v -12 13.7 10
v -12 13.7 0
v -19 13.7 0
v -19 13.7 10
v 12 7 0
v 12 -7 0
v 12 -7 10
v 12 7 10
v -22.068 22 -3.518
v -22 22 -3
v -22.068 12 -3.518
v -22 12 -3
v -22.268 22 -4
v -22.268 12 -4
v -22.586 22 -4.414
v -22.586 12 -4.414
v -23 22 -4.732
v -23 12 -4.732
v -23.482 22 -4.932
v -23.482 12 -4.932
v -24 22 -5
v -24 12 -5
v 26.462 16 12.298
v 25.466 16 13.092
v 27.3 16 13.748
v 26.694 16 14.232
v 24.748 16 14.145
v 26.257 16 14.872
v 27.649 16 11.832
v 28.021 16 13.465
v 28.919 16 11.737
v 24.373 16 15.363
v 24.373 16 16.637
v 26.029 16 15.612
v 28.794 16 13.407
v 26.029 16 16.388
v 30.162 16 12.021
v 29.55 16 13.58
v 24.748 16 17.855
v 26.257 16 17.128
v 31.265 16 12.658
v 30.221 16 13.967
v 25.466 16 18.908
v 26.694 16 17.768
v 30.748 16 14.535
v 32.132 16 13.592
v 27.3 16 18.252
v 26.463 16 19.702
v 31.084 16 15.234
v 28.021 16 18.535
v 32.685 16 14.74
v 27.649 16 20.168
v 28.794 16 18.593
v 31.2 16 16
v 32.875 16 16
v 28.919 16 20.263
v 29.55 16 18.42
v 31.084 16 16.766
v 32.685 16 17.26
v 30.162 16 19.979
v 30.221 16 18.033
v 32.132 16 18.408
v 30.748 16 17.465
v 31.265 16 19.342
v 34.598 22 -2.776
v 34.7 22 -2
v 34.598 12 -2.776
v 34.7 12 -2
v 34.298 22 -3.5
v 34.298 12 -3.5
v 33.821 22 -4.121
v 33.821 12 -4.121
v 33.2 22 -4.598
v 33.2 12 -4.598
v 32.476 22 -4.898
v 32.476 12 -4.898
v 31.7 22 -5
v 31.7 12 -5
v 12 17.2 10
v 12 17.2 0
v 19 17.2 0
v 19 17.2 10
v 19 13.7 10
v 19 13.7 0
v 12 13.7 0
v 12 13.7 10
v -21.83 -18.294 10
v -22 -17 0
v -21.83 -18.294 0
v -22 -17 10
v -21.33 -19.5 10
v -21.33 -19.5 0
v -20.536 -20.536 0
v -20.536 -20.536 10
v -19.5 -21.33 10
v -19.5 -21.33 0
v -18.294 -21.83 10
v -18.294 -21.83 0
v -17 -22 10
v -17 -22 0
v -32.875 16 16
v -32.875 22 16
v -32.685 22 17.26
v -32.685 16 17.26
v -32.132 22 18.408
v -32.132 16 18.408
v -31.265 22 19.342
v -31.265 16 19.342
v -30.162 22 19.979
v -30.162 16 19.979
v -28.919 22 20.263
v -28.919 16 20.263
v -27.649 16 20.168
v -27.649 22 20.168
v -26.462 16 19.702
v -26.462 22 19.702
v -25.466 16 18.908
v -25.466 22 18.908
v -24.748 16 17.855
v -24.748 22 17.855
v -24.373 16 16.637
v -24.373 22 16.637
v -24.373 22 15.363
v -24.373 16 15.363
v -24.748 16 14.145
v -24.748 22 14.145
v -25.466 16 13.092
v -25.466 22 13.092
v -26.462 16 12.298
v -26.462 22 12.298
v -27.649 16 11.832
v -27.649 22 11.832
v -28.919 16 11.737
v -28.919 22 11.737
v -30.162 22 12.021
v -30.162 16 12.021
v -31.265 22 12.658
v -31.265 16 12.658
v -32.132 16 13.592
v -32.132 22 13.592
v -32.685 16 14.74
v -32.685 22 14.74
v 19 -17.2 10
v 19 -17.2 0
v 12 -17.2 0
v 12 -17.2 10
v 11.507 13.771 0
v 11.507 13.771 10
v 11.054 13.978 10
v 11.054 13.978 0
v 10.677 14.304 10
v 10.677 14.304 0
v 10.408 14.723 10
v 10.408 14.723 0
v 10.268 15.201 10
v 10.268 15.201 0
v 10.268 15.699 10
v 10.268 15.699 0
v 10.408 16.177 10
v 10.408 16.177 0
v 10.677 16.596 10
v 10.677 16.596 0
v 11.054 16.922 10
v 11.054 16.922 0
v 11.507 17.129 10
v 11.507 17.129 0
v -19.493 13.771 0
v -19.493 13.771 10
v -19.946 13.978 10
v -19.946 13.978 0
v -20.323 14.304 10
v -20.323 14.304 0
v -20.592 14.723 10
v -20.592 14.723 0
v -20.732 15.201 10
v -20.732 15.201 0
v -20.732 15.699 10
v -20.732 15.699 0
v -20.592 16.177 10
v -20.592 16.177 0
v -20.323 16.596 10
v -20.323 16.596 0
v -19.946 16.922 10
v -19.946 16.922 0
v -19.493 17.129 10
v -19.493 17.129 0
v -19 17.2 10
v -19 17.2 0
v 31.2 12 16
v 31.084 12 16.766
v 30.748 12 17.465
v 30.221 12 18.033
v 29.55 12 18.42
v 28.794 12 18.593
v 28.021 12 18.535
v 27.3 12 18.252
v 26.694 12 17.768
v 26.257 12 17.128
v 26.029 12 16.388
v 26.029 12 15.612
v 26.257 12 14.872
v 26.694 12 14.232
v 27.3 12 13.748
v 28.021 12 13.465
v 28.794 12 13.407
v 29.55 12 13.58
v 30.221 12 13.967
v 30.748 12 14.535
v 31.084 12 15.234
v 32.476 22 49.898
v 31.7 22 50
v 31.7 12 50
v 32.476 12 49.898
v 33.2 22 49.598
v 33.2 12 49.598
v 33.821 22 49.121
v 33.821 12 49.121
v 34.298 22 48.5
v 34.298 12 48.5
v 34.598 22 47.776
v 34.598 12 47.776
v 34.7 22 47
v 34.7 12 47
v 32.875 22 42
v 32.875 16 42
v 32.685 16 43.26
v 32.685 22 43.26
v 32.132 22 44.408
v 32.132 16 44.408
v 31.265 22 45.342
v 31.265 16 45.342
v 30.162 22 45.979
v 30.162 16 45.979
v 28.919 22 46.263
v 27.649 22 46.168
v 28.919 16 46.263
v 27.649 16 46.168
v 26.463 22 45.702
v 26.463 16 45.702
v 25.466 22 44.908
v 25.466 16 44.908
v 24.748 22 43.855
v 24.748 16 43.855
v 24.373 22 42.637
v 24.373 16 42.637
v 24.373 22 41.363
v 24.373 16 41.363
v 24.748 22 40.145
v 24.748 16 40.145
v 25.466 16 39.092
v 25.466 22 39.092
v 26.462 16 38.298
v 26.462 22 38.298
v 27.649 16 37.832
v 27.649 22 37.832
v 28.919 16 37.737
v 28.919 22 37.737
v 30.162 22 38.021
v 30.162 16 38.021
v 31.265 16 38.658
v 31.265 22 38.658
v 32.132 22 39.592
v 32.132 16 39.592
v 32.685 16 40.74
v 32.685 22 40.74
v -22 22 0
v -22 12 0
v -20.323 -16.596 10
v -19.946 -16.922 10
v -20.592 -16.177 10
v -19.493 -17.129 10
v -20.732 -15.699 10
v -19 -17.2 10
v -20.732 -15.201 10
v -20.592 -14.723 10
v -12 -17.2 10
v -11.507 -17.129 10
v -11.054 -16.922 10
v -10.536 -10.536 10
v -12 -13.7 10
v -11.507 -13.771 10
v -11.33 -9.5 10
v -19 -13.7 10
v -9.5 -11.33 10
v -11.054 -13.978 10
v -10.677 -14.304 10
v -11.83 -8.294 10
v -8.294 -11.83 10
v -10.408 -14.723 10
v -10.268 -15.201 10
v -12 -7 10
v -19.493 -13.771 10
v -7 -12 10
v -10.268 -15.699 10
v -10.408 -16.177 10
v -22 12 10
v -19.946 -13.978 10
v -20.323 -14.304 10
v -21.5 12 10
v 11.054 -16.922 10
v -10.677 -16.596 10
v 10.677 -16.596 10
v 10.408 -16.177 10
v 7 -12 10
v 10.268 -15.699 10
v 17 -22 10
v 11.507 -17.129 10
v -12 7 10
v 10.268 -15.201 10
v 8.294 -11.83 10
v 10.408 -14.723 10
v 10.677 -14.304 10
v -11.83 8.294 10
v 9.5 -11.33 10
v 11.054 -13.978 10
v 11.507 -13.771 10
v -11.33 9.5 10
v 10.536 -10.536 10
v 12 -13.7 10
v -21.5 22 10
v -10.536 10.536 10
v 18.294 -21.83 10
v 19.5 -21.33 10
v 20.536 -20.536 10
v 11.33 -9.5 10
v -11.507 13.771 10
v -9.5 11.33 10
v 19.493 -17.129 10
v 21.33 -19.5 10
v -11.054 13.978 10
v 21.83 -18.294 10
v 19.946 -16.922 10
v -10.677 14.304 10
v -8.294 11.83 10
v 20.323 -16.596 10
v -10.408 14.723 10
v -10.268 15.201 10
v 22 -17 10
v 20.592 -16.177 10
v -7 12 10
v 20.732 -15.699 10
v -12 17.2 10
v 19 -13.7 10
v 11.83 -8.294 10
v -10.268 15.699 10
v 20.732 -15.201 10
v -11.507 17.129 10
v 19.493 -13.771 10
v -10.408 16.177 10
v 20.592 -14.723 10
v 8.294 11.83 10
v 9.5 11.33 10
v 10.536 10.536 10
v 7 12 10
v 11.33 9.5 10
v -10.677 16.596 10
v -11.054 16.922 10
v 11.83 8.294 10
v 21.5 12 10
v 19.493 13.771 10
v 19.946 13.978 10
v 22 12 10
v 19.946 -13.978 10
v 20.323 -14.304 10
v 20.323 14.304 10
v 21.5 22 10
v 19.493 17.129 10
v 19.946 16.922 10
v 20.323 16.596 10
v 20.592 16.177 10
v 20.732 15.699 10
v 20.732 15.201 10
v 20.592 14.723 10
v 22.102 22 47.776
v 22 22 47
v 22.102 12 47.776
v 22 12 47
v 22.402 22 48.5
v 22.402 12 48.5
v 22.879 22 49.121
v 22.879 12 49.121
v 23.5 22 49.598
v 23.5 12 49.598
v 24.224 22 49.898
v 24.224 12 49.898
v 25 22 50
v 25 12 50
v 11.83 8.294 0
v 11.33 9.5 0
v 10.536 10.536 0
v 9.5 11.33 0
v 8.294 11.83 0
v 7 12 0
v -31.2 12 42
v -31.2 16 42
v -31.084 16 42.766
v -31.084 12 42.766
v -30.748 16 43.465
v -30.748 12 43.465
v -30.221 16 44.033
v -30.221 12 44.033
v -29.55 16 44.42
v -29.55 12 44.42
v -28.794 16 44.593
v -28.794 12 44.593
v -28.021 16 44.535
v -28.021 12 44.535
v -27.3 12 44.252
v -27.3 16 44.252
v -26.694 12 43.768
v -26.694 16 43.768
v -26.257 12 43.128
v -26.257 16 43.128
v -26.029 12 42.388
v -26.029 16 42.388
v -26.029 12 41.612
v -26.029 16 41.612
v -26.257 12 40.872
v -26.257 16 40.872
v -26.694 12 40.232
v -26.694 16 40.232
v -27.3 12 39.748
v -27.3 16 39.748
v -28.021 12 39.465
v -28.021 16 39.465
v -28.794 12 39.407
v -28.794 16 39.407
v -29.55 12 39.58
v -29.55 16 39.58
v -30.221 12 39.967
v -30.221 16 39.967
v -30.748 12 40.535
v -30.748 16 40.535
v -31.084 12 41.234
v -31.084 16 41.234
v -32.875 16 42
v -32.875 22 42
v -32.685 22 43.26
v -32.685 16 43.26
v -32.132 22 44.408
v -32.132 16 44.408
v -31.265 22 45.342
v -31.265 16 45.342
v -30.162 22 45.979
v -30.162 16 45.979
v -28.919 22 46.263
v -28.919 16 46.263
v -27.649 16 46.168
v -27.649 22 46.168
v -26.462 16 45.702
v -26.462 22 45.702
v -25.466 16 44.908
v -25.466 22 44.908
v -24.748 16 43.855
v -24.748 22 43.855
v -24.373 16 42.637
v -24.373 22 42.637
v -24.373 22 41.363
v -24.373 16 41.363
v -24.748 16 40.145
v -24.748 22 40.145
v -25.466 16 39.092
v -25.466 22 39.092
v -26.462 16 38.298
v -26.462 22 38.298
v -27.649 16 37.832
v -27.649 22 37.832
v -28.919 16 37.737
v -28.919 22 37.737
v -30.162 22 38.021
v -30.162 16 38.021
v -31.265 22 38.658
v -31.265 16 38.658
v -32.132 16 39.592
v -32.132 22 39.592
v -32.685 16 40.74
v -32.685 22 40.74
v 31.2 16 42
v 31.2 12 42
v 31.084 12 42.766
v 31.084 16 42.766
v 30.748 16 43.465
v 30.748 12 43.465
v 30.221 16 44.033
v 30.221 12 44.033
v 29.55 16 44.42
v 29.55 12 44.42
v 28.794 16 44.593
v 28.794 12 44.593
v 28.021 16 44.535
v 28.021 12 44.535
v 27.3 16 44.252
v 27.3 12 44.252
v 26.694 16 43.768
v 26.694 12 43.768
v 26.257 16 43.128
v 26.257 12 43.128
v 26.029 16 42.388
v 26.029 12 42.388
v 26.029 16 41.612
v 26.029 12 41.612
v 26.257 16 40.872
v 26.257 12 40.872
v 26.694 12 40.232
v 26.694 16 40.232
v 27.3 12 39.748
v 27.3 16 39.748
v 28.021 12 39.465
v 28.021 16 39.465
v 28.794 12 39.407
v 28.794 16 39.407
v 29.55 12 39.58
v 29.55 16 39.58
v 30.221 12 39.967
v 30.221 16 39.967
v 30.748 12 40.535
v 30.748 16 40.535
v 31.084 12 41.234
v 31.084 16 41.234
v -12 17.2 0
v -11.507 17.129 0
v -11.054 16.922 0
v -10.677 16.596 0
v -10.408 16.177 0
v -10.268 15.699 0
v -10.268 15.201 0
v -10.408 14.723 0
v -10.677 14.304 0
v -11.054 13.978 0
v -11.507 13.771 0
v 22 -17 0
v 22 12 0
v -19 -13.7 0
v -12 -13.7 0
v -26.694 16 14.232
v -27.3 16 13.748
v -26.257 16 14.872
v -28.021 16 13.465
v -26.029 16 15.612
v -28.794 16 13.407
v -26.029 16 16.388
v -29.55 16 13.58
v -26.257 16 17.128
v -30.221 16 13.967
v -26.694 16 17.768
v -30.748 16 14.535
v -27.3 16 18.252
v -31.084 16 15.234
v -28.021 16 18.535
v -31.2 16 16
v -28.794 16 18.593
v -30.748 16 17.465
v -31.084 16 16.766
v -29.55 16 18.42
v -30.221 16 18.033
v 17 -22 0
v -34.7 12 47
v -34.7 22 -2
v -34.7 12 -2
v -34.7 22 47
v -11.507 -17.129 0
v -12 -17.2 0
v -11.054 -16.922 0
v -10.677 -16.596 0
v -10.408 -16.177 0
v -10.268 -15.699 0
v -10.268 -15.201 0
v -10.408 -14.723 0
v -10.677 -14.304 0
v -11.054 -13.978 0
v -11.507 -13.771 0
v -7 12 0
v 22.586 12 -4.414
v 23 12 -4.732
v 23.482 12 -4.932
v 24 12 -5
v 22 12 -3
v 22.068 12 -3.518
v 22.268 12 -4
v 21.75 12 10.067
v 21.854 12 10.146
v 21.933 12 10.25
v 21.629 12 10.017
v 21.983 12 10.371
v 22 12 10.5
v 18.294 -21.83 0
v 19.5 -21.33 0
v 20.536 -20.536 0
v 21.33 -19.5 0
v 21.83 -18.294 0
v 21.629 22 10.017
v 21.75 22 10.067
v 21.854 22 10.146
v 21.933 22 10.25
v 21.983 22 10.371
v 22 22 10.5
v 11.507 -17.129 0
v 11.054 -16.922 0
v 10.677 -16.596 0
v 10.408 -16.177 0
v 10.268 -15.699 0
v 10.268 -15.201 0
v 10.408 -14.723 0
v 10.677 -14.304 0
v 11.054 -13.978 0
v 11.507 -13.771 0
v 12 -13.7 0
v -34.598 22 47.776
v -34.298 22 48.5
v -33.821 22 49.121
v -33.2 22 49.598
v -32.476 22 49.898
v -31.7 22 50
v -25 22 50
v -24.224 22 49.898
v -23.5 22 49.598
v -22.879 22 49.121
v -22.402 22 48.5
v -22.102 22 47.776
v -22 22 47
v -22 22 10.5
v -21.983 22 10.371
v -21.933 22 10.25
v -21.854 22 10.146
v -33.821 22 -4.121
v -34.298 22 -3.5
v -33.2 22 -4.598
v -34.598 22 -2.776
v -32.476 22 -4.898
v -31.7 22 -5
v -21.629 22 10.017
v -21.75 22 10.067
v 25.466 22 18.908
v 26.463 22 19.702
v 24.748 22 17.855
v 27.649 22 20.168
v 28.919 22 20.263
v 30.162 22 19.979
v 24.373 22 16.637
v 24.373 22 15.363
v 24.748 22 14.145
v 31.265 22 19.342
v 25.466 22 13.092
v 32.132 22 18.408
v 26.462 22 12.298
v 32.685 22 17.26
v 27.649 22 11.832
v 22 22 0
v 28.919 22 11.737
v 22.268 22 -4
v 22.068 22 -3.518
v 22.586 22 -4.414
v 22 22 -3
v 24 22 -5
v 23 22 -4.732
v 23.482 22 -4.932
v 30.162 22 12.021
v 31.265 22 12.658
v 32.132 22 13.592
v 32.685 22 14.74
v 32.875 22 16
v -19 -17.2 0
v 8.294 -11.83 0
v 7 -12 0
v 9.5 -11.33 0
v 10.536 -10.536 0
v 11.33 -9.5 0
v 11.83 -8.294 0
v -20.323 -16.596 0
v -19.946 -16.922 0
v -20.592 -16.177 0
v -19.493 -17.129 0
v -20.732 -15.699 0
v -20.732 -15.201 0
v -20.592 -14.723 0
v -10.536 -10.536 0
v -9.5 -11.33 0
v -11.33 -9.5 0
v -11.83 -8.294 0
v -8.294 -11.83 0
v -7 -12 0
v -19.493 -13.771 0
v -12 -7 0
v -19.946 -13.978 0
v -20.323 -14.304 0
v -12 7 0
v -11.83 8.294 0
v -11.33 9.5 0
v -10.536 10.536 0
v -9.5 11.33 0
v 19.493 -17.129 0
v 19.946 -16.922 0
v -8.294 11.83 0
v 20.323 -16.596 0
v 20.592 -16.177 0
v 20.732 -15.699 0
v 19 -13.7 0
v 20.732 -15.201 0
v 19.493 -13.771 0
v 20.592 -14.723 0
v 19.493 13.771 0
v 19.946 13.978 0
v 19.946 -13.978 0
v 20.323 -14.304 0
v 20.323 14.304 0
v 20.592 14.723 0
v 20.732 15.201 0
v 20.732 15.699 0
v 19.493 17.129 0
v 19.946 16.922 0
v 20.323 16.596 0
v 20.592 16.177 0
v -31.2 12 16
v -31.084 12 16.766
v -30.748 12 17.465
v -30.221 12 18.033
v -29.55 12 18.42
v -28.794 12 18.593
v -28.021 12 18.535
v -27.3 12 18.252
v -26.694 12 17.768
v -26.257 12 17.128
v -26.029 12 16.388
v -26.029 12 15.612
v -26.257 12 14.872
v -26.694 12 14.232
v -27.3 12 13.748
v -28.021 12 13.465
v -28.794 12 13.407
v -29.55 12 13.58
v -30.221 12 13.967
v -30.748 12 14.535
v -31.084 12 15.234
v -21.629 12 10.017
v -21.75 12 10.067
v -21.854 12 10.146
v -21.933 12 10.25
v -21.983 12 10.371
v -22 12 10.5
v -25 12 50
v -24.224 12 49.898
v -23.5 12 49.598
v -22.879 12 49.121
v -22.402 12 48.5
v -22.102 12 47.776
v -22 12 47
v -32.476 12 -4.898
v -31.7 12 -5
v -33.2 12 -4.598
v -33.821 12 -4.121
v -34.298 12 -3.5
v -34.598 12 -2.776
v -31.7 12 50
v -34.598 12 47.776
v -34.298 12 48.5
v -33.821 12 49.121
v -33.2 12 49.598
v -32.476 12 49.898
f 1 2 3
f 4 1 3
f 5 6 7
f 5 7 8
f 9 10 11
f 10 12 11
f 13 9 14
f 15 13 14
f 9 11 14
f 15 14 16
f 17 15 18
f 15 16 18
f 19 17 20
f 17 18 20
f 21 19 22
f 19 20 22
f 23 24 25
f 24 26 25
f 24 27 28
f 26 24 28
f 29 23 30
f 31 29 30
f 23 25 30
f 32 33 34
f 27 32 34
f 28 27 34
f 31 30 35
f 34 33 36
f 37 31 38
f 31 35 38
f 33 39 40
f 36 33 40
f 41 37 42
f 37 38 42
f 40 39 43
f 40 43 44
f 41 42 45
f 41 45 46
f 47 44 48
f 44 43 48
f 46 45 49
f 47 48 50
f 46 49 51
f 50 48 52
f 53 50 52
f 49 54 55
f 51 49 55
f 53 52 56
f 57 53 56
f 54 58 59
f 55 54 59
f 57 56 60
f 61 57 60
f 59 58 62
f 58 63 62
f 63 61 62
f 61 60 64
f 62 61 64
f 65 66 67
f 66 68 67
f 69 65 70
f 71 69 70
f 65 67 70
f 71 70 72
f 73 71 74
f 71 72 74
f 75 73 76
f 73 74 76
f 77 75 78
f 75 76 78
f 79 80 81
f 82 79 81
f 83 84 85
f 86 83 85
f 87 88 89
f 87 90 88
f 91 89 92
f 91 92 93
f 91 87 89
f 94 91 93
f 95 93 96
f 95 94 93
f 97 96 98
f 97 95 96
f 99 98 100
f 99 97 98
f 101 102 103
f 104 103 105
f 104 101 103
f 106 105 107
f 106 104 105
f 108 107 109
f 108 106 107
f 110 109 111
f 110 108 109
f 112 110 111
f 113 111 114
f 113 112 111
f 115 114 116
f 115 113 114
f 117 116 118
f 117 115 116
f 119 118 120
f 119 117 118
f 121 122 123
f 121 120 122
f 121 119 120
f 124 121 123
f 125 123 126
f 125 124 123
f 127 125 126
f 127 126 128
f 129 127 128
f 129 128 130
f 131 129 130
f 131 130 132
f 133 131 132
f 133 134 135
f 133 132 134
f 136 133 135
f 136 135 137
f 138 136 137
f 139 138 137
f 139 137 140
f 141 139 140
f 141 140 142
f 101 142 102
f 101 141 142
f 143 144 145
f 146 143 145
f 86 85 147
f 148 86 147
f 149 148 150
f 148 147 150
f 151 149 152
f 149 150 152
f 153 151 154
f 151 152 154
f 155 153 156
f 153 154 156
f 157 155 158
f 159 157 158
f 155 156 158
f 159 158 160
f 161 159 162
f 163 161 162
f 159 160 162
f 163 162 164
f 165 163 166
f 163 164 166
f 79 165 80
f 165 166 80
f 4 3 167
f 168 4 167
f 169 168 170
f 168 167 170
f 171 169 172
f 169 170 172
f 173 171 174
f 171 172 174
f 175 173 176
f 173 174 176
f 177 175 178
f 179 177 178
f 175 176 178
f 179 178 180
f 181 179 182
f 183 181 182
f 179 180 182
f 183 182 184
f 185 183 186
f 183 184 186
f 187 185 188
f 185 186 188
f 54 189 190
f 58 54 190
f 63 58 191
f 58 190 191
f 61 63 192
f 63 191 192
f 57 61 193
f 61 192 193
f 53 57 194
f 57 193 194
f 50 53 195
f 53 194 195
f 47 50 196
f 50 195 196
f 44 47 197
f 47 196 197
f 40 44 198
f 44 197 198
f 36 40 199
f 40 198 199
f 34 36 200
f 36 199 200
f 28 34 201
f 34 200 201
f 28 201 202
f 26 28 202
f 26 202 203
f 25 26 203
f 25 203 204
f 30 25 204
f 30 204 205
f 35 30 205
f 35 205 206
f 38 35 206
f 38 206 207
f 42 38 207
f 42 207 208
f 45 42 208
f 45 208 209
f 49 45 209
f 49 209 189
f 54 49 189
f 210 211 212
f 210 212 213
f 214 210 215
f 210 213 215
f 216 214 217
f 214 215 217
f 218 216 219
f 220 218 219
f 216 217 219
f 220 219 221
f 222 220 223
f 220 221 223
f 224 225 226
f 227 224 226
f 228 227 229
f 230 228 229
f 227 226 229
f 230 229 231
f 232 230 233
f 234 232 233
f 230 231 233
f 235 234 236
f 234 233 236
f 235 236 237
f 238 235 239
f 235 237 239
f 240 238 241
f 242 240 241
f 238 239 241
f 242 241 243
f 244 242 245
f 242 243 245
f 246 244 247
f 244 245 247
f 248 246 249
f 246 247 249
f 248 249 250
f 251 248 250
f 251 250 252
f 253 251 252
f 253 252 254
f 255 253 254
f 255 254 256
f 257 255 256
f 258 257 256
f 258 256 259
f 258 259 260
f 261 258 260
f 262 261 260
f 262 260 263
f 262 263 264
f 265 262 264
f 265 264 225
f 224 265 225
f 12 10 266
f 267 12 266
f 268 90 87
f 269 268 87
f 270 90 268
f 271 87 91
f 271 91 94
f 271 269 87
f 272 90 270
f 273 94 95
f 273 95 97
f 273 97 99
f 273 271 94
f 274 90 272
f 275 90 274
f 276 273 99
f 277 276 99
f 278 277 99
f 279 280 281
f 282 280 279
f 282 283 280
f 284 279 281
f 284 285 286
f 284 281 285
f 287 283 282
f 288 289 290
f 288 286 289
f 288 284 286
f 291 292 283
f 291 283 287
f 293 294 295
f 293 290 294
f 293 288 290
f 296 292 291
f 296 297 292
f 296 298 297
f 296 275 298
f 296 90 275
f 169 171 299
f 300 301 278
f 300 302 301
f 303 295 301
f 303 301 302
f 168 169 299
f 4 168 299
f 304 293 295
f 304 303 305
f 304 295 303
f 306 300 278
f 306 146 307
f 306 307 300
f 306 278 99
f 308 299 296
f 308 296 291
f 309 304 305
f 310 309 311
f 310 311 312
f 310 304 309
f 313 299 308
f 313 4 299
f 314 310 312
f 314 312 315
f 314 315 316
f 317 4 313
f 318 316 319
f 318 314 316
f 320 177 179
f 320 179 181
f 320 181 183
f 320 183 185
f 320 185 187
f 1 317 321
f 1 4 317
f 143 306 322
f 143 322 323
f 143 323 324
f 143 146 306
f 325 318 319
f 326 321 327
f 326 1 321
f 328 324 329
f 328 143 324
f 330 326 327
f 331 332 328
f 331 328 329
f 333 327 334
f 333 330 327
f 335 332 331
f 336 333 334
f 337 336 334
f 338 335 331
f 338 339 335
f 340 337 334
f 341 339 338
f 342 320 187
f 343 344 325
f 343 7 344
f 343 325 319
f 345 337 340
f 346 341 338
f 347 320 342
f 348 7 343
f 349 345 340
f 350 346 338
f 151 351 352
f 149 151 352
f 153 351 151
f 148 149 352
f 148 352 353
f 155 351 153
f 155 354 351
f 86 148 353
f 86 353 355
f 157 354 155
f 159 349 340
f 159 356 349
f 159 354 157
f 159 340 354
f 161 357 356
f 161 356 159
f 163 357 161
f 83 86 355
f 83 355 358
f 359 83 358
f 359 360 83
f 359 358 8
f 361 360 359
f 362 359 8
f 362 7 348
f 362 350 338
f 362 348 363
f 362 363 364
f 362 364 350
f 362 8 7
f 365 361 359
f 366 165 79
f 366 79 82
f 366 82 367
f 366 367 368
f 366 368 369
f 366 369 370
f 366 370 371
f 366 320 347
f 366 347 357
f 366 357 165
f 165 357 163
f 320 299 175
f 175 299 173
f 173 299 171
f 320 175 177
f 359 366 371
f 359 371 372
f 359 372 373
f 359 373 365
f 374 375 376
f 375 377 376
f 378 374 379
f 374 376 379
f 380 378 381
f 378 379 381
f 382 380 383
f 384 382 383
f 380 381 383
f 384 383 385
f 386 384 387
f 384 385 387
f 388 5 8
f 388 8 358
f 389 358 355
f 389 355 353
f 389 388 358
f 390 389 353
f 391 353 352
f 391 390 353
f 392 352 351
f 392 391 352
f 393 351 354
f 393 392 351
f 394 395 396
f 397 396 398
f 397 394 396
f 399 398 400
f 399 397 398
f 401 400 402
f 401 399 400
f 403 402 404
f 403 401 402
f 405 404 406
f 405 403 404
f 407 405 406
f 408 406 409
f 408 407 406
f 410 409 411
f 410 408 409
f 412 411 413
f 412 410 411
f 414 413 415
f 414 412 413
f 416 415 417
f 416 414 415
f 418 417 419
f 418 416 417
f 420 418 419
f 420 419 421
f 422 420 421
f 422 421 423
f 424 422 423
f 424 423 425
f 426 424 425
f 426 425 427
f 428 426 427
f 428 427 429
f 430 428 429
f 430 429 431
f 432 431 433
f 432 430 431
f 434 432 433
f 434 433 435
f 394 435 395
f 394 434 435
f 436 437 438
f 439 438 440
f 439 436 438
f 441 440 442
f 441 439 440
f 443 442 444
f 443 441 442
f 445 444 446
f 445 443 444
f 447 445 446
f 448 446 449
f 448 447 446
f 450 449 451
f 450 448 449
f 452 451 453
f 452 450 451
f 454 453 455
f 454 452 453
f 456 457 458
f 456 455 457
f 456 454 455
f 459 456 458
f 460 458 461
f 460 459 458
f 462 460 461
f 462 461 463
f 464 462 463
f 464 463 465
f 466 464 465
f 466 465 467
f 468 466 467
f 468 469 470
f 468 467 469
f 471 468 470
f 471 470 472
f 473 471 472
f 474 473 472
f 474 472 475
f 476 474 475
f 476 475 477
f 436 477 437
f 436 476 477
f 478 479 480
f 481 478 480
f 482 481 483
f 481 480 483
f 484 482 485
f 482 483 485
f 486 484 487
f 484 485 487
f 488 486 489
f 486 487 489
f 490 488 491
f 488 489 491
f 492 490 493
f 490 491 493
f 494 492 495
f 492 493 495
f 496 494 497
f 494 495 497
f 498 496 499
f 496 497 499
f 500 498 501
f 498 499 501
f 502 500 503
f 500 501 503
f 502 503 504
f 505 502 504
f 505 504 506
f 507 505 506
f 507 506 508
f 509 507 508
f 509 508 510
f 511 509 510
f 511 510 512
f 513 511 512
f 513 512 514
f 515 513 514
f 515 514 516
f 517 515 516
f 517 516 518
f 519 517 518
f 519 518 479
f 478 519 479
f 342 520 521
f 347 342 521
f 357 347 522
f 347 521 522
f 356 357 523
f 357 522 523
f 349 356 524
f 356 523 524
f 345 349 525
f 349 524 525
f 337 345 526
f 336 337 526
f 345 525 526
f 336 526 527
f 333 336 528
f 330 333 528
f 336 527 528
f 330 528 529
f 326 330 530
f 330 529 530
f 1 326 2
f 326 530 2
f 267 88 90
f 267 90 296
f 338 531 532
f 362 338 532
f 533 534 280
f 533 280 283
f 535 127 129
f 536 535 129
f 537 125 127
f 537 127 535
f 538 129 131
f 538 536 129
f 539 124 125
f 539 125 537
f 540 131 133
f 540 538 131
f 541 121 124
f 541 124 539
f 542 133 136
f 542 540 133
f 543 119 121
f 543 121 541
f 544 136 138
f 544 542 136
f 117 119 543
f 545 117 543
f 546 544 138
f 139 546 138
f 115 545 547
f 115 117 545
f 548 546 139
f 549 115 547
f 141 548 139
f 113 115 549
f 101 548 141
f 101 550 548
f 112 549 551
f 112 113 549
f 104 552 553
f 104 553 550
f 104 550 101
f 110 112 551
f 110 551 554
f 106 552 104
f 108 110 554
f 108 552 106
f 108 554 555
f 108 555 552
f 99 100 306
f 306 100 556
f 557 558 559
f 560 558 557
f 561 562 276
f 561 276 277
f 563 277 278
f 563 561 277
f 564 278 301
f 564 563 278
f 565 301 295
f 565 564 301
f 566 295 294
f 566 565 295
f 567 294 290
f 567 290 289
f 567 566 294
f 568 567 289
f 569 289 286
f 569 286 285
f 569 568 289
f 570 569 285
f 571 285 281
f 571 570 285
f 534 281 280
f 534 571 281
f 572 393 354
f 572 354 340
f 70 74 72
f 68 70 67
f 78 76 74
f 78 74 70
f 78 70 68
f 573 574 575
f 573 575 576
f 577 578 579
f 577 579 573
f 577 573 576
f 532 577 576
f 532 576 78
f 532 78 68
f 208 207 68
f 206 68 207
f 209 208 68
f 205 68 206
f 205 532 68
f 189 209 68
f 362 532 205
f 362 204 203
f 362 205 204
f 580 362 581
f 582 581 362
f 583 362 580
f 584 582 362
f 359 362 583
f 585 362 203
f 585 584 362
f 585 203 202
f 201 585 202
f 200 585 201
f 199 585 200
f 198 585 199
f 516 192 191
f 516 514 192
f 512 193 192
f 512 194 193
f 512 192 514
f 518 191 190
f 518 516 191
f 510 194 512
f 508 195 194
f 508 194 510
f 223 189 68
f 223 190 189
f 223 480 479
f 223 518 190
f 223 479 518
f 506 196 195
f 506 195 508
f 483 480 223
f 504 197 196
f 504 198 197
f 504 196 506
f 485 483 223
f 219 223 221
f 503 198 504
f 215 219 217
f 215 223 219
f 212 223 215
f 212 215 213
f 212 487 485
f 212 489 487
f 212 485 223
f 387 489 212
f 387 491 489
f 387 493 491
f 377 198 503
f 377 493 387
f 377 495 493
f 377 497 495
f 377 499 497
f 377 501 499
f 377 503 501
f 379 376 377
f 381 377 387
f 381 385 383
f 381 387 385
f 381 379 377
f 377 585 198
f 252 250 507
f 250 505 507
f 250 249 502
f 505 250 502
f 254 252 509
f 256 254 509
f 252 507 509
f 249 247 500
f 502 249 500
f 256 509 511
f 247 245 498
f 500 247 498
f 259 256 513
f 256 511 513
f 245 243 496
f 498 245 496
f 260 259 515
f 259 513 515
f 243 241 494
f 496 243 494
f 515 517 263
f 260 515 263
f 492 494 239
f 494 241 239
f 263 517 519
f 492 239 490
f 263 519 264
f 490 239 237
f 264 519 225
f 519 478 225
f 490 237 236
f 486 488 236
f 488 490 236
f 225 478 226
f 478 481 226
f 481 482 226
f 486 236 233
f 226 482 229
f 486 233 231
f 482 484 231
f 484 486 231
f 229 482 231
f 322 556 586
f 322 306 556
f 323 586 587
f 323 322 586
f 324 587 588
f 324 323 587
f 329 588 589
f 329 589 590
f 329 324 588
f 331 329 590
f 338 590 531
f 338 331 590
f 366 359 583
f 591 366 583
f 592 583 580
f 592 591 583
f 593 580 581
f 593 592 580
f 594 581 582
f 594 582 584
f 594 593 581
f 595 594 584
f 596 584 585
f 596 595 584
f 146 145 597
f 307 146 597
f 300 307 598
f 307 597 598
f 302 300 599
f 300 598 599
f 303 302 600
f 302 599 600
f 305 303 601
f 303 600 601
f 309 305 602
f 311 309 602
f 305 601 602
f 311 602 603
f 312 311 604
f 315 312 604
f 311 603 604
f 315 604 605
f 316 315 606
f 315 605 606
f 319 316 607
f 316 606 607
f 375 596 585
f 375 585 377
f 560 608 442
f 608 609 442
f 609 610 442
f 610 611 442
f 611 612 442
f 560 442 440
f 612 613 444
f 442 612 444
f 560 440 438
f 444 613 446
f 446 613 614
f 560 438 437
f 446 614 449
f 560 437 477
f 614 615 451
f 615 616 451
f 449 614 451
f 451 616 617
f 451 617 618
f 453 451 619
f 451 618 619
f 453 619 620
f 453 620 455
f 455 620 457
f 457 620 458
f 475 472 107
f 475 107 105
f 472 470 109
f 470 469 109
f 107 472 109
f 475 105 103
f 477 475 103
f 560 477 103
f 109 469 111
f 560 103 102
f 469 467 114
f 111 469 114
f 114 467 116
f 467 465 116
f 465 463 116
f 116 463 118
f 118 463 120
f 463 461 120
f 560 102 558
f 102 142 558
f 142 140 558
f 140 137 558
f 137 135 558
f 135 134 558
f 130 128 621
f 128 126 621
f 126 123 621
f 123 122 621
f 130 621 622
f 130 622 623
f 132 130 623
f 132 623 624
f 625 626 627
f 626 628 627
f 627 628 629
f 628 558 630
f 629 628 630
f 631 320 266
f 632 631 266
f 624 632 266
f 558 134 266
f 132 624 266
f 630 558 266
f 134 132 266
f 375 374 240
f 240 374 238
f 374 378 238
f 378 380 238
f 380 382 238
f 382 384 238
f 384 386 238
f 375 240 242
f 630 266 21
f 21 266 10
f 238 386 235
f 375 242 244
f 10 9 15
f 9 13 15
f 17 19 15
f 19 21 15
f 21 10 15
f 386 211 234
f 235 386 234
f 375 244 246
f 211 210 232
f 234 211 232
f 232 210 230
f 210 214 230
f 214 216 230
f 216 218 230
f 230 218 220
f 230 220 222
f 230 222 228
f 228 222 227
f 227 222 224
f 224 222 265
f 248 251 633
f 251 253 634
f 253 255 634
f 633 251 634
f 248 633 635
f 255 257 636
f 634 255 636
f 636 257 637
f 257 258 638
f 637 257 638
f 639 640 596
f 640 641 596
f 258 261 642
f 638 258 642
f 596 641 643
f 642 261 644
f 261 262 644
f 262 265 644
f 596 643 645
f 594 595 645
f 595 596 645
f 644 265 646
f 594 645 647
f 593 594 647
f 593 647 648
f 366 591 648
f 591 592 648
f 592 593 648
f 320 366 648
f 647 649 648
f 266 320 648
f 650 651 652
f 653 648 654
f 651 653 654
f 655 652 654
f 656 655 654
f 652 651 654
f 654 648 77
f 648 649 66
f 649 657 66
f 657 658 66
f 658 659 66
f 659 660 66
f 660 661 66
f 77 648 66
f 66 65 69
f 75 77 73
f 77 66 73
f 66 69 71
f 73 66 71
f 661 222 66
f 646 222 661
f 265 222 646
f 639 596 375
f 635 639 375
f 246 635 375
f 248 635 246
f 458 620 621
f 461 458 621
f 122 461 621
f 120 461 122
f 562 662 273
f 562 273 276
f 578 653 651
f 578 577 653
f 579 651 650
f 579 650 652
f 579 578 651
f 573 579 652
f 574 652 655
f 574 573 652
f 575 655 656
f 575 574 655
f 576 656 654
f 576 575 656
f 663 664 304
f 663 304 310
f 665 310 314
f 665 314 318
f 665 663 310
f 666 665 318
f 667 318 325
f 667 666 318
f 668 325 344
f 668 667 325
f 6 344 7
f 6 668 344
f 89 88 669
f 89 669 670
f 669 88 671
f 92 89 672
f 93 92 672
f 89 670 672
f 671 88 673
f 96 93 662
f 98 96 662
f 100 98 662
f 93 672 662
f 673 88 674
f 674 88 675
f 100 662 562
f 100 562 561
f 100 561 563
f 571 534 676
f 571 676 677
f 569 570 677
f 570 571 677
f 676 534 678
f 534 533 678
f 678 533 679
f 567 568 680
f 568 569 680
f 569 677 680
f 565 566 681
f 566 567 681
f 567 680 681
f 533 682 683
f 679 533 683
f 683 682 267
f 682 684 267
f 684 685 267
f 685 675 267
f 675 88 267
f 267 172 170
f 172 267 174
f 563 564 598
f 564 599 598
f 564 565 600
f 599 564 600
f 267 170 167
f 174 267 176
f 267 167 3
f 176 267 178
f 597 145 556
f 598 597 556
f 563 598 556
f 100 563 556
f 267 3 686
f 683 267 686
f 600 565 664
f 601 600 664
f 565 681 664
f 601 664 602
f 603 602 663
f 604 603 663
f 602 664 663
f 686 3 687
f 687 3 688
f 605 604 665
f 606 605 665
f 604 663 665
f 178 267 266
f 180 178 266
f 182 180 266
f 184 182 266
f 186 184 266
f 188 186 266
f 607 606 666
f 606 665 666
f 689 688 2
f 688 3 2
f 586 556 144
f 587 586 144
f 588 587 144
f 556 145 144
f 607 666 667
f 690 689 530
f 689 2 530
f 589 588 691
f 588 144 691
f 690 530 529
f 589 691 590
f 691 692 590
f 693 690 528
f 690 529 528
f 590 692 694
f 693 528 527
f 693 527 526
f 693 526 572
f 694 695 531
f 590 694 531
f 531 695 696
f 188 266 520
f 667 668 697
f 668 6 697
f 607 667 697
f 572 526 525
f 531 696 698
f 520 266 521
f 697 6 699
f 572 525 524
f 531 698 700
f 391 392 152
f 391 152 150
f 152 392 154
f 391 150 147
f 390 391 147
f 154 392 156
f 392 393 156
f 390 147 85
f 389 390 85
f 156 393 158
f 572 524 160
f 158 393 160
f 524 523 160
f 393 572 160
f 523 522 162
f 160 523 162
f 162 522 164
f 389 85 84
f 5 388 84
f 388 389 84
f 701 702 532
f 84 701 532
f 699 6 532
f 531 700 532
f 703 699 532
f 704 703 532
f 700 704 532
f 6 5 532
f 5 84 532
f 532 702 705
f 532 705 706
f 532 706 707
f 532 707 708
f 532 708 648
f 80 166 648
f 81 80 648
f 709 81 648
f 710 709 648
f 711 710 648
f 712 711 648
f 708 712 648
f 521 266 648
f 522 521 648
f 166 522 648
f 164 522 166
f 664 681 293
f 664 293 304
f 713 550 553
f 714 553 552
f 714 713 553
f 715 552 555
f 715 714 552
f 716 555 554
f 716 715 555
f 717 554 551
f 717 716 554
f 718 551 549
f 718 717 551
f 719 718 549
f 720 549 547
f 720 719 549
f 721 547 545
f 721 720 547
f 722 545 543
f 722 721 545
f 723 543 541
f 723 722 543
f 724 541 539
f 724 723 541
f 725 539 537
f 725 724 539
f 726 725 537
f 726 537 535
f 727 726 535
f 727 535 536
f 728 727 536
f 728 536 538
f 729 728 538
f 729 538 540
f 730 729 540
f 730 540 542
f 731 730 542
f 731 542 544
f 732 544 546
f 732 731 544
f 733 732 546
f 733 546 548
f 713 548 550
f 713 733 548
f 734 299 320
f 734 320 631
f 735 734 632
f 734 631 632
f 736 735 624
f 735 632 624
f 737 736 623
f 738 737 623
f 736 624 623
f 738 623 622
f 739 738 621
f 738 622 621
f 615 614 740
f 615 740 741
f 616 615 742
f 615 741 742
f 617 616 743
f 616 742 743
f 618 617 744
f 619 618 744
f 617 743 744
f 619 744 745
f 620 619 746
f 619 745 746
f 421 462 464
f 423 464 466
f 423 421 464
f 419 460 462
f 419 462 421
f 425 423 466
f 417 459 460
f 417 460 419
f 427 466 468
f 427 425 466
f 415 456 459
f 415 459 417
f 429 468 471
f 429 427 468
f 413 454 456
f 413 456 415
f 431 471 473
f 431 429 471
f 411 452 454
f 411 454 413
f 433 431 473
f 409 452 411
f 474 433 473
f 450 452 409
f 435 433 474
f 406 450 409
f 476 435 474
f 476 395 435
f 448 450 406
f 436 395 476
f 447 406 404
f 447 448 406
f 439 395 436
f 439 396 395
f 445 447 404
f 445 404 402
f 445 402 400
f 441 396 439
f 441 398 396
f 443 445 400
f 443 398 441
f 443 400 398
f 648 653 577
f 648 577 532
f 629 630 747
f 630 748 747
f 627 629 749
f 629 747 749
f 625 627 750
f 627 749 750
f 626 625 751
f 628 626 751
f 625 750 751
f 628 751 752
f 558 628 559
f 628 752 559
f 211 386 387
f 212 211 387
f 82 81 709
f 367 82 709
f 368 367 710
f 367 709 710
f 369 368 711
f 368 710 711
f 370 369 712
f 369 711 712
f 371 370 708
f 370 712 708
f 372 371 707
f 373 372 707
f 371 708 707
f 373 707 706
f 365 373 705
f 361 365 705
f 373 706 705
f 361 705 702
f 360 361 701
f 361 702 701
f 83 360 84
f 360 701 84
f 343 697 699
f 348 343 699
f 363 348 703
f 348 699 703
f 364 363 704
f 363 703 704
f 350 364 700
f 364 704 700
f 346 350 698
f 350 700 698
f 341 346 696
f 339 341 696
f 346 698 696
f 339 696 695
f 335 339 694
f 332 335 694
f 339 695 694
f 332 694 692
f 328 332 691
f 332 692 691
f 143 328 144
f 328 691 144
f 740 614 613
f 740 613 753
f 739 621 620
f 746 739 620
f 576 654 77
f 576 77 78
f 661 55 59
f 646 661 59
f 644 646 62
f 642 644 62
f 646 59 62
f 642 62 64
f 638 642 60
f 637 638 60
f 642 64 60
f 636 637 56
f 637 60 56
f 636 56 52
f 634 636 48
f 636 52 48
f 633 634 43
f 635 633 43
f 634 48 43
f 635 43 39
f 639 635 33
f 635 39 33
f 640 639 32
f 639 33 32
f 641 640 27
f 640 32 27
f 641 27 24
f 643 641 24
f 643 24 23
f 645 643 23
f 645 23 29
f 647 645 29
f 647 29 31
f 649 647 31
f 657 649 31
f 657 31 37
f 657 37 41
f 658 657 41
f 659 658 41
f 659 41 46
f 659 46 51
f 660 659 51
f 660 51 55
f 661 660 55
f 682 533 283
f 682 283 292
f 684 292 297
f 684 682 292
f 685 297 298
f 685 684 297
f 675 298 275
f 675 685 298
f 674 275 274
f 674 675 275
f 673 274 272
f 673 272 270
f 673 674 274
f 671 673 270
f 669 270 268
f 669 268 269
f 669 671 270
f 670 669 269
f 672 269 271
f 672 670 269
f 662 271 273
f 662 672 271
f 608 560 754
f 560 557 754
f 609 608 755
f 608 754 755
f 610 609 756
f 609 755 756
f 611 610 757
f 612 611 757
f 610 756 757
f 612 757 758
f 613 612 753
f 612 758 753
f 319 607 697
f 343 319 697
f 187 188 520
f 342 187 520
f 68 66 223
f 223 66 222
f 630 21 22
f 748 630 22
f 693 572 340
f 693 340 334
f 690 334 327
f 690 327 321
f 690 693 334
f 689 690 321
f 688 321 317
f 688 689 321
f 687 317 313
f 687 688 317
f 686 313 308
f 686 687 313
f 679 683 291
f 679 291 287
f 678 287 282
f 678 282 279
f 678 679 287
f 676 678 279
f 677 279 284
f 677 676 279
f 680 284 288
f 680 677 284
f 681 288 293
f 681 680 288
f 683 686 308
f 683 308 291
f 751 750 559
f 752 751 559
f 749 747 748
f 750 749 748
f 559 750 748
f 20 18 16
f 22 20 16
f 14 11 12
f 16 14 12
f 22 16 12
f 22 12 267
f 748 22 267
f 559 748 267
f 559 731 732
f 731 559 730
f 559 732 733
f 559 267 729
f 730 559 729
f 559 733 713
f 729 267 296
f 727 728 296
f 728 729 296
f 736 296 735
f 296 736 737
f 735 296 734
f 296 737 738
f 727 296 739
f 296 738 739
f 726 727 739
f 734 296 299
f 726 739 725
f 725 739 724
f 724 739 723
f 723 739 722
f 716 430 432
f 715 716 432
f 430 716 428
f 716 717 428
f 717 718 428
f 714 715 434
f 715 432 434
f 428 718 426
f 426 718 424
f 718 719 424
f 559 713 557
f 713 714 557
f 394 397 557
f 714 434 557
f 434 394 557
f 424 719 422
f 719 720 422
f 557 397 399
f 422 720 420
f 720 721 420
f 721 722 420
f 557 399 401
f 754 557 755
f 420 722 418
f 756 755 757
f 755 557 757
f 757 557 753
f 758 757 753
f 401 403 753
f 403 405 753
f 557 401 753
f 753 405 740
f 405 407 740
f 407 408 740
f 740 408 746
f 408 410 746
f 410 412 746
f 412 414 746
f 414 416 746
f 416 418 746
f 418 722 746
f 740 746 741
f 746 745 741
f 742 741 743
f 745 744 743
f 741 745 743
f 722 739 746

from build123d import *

# Parameters (mm, degrees)
SKETCH1_W           = 44
SKETCH1_H           = 44
BOSS_EXTRUDE1_DEPTH = 10
BOSS_EXTRUDE2_DEPTH = 12.7
SKETCH3_R           = 2.6
CUT_EXTRUDE1_DEPTH  = 70.714345726
SKETCH4_R           = 4.275
CUT_EXTRUDE2_DEPTH  = 72.750191637
FILLET1_R           = 3
FILLET2_R           = 5
FILLET3_R           = 0.5
FILLET4_R           = 2


with BuildPart() as part:
    # Sketch1 → Boss-Extrude1 (new body)
    with BuildSketch(Plane.XY):
        Rectangle(SKETCH1_W, SKETCH1_H)
        with BuildLine():
            Line((7, 12), (-7, 12))
            ThreePointArc((-7, 12), (-10.535533906, 10.535533906), (-12, 7))
            Line((-12, 7), (-12, -7))
            ThreePointArc((-12, -7), (-10.535533906, -10.535533906), (-7, -12))
            Line((-7, -12), (7, -12))
            ThreePointArc((7, -12), (10.535533906, -10.535533906), (12, -7))
            Line((12, -7), (12, 7))
            ThreePointArc((12, 7), (10.535533906, 10.535533906), (7, 12))
        make_face(mode=Mode.SUBTRACT)
        with BuildLine():
            Line((-19, 17.2), (-12, 17.2))
            ThreePointArc((-12, 17.2), (-10.25, 15.45), (-12, 13.7))
            Line((-12, 13.7), (-19, 13.7))
            ThreePointArc((-19, 13.7), (-20.75, 15.45), (-19, 17.2))
        make_face(mode=Mode.SUBTRACT)
        with BuildLine():
            Line((-19, -17.2), (-12, -17.2))
            ThreePointArc((-12, -17.2), (-10.25, -15.45), (-12, -13.7))
            Line((-12, -13.7), (-19, -13.7))
            ThreePointArc((-19, -13.7), (-20.75, -15.45), (-19, -17.2))
        make_face(mode=Mode.SUBTRACT)
        with BuildLine():
            Line((12, 17.2), (19, 17.2))
            ThreePointArc((19, 17.2), (20.75, 15.45), (19, 13.7))
            Line((19, 13.7), (12, 13.7))
            ThreePointArc((12, 13.7), (10.25, 15.45), (12, 17.2))
        make_face(mode=Mode.SUBTRACT)
        with BuildLine():
            Line((12, -13.7), (19, -13.7))
            ThreePointArc((19, -13.7), (20.75, -15.45), (19, -17.2))
            Line((19, -17.2), (12, -17.2))
            ThreePointArc((12, -17.2), (10.25, -15.45), (12, -13.7))
        make_face(mode=Mode.SUBTRACT)
    extrude(amount=BOSS_EXTRUDE1_DEPTH)

    # Sketch2 → Boss-Extrude2 (add)
    with BuildSketch(Plane(origin=(22, 0, 0), x_dir=(0, 0, -1), z_dir=(1, 0, 0))):
        Polygon((5, 12), (-50, 12), (-50, 16), (-50, 22), (5, 22), align=None)
    boss_extrude2 = extrude(amount=BOSS_EXTRUDE2_DEPTH)

    # Sketch3 → Cut-Extrude1 (cut, through all)
    with BuildSketch(Plane.XZ.offset(-12)):
        with Locations((28.6, 42)):
            Circle(SKETCH3_R)
        with Locations((28.6, 16)):
            Circle(SKETCH3_R)
    cut_extrude1 = extrude(amount=-CUT_EXTRUDE1_DEPTH, mode=Mode.SUBTRACT)

    # Sketch4 → Cut-Extrude2 (cut, through all)
    with BuildSketch(Plane(origin=(0, 16, 0), x_dir=(-1, 0, 0), z_dir=(0, -1, 0))):
        with Locations(Location((-28.6, -16, 0), (0, 0, 180))):
            Circle(SKETCH4_R)
        with Locations(Location((-28.6, -42, 0), (0, 0, 180))):
            Circle(SKETCH4_R)
    cut_extrude2 = extrude(amount=-CUT_EXTRUDE2_DEPTH, mode=Mode.SUBTRACT)

    # Mirror1: Boss-Extrude2, Cut-Extrude1, Cut-Extrude2 across plane
    add(boss_extrude2.mirror(Plane(origin=(0, 0, 0), x_dir=(0, 0, 1), z_dir=(1, 0, 0))))
    add(cut_extrude1.mirror(Plane(origin=(0, 0, 0), x_dir=(0, 0, 1), z_dir=(1, 0, 0))), mode=Mode.SUBTRACT)
    add(cut_extrude2.mirror(Plane(origin=(0, 0, 0), x_dir=(0, 0, 1), z_dir=(1, 0, 0))), mode=Mode.SUBTRACT)

    # Fillet1
    fillet1_edges = [part.edges().sort_by_distance(p)[0] for p in [
        (34.7, 17, -5),
        (34.7, 17, 50),
        (-34.7, 17, -5),
        (-34.7, 17, 50),
        (-22, 17, 50),
        (22, 17, 50),
    ]]
    fillet(fillet1_edges, radius=FILLET1_R)

    # Fillet2
    fillet2_edges = [part.edges().sort_by_distance(p)[0] for p in [
        (22, -22, 5),
        (-22, -22, 5),
    ]]
    fillet(fillet2_edges, radius=FILLET2_R)

    # Fillet3
    fillet3_edges = [part.edges().sort_by_distance(p)[0] for p in [
        (-22, 17, 10),
        (22, 17, 10),
    ]]
    fillet(fillet3_edges, radius=FILLET3_R)

    # Fillet4
    fillet4_edges = [part.edges().sort_by_distance(p)[0] for p in [
        (-22, 17, -5),
        (22, 17, -5),
    ]]
    fillet(fillet4_edges, radius=FILLET4_R)


solid = part.part
